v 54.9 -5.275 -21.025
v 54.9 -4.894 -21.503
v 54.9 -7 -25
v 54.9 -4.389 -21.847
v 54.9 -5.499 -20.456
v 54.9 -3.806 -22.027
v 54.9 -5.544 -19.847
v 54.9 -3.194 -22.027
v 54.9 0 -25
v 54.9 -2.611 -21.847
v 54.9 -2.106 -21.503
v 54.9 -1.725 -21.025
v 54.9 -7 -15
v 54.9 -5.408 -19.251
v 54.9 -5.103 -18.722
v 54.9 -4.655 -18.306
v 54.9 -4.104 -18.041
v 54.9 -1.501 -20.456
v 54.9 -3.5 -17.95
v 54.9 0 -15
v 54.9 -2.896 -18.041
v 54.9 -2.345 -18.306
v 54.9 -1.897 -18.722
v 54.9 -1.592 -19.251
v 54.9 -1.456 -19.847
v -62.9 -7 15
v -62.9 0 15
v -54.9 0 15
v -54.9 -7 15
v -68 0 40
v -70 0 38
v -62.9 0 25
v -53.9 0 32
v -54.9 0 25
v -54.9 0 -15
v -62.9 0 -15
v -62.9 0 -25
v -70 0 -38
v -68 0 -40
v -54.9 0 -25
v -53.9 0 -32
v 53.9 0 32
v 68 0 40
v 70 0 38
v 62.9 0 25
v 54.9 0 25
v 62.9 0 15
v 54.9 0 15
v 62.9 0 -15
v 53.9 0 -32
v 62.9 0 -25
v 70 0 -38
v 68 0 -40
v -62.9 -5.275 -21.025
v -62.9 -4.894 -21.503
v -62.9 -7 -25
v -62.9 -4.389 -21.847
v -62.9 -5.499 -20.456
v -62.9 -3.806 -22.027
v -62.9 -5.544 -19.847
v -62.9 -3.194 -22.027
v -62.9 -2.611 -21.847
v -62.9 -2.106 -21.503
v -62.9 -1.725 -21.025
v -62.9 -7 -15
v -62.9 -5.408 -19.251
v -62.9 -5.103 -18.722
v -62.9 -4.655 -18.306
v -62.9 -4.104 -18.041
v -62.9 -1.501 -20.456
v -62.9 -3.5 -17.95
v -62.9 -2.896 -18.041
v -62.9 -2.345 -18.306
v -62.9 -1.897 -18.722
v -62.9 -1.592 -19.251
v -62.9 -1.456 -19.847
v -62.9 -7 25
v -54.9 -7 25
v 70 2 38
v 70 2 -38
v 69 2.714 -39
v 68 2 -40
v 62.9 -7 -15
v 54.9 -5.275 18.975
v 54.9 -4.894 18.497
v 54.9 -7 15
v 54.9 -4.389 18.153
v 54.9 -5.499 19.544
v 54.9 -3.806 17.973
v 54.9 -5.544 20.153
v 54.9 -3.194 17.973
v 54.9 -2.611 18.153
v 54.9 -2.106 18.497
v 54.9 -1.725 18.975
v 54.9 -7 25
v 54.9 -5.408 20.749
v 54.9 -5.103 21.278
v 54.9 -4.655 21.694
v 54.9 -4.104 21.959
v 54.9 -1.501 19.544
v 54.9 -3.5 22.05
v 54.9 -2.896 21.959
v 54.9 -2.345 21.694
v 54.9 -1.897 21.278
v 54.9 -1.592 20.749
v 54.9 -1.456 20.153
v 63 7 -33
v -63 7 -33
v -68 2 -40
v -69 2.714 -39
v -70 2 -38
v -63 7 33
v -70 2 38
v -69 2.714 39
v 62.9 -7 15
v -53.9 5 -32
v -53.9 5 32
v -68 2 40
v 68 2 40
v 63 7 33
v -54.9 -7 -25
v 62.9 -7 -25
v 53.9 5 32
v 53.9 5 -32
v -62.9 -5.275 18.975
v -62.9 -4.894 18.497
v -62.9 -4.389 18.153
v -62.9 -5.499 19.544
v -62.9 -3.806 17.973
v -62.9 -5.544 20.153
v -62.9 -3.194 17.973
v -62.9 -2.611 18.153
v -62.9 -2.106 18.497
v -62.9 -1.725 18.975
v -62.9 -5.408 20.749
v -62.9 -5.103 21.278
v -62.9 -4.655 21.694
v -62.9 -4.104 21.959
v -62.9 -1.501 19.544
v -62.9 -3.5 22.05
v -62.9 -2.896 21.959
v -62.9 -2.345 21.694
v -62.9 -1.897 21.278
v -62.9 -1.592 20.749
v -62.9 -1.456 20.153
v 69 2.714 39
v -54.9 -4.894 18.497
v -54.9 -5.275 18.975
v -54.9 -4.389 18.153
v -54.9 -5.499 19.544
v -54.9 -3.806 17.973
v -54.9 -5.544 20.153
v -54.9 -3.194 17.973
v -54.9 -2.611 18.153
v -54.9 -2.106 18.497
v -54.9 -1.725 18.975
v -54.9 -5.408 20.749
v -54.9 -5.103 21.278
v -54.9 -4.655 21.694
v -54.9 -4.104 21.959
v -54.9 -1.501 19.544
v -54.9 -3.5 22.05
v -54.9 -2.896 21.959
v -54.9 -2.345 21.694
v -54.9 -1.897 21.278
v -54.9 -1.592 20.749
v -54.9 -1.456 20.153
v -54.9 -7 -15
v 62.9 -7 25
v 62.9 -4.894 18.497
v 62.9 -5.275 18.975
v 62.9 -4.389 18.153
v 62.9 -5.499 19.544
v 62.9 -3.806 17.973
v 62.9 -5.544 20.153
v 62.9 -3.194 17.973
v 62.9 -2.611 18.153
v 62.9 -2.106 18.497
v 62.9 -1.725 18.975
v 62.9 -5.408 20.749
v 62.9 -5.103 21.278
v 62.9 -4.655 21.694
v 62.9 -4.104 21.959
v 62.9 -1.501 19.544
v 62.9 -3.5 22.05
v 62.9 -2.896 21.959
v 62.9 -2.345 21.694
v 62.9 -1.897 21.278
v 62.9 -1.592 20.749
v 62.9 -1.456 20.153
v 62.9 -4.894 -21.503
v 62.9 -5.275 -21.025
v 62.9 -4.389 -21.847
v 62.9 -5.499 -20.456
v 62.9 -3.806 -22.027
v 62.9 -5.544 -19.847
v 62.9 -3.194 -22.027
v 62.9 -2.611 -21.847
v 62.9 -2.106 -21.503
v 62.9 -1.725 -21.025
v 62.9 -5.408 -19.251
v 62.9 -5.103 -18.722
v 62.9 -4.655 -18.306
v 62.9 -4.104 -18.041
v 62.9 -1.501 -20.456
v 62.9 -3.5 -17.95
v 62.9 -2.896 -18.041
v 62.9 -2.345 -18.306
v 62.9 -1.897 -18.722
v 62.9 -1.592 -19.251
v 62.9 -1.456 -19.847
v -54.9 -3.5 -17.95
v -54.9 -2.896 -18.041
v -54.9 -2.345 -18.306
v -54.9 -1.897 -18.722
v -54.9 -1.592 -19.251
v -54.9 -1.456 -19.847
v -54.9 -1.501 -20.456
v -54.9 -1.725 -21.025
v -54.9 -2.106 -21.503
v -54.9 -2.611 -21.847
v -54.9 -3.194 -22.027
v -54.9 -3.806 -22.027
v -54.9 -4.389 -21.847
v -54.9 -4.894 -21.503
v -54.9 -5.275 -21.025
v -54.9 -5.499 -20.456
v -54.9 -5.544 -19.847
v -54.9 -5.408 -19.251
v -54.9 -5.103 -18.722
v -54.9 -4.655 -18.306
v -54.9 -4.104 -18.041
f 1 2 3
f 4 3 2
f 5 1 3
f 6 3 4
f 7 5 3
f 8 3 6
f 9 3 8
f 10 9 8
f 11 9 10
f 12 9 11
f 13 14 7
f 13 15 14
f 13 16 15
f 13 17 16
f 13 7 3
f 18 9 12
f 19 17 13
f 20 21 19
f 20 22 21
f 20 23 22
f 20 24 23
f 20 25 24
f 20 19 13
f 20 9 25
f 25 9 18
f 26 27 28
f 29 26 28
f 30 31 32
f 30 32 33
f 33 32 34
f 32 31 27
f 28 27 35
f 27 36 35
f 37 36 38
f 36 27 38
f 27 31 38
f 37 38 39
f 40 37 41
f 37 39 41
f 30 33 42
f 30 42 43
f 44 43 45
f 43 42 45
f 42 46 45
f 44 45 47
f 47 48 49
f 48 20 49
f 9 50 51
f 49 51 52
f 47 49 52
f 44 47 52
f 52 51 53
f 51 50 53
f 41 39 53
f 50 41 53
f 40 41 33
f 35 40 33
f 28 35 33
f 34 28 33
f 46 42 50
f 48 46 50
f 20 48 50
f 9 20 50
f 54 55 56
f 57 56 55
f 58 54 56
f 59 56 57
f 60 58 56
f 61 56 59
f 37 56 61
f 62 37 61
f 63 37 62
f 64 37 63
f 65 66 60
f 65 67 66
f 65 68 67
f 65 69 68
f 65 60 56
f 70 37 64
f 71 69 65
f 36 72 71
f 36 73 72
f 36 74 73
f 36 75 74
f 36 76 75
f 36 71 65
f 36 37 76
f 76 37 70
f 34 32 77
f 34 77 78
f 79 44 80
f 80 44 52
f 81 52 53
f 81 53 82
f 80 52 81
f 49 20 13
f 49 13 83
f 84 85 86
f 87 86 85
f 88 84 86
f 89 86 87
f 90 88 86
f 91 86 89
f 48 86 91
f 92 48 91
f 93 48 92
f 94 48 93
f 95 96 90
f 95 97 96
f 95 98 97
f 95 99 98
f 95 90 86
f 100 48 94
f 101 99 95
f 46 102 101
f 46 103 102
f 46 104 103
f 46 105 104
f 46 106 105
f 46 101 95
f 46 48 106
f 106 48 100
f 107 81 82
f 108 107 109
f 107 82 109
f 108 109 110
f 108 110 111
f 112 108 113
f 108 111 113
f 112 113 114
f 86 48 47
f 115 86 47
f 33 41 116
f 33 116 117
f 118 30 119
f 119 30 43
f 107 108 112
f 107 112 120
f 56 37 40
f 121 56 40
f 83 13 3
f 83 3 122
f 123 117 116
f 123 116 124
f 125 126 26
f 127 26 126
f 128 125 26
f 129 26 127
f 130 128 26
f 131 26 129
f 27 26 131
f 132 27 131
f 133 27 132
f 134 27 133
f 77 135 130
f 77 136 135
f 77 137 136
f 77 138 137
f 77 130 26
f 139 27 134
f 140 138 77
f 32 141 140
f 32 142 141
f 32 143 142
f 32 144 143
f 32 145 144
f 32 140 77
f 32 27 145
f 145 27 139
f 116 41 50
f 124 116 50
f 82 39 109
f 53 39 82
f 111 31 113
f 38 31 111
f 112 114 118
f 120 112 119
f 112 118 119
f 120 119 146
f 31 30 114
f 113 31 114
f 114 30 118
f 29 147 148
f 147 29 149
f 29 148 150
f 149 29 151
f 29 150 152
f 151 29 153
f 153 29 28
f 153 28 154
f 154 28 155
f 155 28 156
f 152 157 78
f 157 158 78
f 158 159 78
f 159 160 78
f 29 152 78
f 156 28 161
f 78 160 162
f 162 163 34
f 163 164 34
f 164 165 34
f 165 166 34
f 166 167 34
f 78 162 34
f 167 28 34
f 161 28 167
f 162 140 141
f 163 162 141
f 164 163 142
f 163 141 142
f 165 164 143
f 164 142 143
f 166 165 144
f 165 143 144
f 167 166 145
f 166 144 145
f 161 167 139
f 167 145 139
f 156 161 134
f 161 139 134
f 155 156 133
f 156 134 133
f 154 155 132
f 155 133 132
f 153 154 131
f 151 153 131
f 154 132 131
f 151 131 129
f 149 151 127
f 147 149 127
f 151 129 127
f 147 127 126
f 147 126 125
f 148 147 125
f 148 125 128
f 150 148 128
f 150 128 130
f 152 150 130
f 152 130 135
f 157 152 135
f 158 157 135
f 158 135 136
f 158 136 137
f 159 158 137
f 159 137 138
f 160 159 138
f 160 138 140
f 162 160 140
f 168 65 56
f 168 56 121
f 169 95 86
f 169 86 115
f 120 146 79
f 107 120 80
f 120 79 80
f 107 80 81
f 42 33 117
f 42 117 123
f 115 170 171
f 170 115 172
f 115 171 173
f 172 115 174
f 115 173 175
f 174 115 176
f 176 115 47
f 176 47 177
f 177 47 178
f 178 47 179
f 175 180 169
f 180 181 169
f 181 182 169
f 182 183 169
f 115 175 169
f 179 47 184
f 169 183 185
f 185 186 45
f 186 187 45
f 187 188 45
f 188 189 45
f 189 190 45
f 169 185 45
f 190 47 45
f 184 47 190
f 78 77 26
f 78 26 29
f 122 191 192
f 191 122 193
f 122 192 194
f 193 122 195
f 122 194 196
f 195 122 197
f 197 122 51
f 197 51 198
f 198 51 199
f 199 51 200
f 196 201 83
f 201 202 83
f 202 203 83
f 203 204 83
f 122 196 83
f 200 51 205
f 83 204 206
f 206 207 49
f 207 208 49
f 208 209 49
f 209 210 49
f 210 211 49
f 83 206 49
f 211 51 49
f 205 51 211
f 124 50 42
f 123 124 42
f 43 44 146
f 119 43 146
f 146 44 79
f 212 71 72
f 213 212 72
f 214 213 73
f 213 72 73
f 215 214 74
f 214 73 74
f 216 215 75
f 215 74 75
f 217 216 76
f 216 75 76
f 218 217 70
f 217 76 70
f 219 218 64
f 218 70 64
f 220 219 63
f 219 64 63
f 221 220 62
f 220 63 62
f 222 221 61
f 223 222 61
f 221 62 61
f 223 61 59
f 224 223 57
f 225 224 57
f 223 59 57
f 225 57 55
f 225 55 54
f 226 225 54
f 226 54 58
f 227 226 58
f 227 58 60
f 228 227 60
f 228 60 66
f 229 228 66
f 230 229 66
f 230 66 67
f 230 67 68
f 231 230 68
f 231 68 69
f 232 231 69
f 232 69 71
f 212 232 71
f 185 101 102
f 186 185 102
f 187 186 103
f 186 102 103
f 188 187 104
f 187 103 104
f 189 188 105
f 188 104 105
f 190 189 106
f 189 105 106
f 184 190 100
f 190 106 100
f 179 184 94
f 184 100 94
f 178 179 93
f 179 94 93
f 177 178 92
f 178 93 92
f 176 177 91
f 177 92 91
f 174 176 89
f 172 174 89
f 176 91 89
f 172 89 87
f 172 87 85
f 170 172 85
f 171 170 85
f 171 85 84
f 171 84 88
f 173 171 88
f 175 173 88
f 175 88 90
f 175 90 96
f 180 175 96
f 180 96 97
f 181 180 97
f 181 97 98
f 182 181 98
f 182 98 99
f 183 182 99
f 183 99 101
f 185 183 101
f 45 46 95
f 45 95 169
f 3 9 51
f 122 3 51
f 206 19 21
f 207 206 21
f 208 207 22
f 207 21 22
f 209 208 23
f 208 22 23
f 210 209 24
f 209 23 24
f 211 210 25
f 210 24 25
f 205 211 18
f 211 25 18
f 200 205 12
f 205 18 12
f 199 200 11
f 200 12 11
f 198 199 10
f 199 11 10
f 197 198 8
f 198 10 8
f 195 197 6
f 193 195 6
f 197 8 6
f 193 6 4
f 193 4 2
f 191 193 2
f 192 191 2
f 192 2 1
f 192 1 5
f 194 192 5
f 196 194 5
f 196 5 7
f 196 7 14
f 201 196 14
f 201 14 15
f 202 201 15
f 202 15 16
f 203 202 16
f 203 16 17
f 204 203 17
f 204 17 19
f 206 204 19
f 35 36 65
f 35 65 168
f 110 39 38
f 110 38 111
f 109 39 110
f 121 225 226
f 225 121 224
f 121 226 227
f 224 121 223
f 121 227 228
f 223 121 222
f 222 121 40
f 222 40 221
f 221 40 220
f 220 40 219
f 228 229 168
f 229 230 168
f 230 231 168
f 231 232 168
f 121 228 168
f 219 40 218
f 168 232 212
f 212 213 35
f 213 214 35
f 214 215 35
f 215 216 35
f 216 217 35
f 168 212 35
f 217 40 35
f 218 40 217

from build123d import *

# Parameters (mm, degrees)
SKETCH1_W           = 140
SKETCH1_H           = 80
BOSS_EXTRUDE1_DEPTH = 2
SKETCH3_W           = 126
SKETCH3_H           = 66
SKETCH2_W           = 140
SKETCH2_H           = 80
CHAMFER2_SIZE       = 2
SKETCH4_W           = 8
SKETCH4_H           = 10
BOSS_EXTRUDE2_DEPTH = 7
SKETCH5_R           = 2.05
CUT_EXTRUDE1_DEPTH  = 133.9000001
SKETCH6_W           = 107.8
SKETCH6_H           = 64
CUT_EXTRUDE2_DEPTH  = 5


with BuildPart() as part:
    # Sketch1 → Boss-Extrude1 (new body)
    with BuildSketch(Plane(origin=(0, 0, 0), x_dir=(1, 0, 0), z_dir=(0, 1, 0))):
        Rectangle(SKETCH1_W, SKETCH1_H)
    extrude(amount=BOSS_EXTRUDE1_DEPTH)

    # Sketch3 → Loft1 section 0
    with BuildSketch(Plane(origin=(0, 7, 0), x_dir=(1, 0, 0), z_dir=(0, 1, 0))):
        Rectangle(SKETCH3_W, SKETCH3_H)
    # Sketch2 → Loft1 section 1
    with BuildSketch(Plane(origin=(0, 2, 0), x_dir=(1, 0, 0), z_dir=(0, 1, 0))):
        Rectangle(SKETCH2_W, SKETCH2_H)
    loft()

    # Chamfer2
    chamfer2_edges = [part.edges().sort_by_distance(p)[0] for p in [
        (70, 1, 40),
        (-70, 1, 40),
        (-70, 1, -40),
        (70, 1, -40),
    ]]
    chamfer(chamfer2_edges, length=CHAMFER2_SIZE)

    # Sketch4 → Boss-Extrude2 (add)
    with BuildSketch(Plane.XZ):
        with Locations((-58.9, 20)):
            Rectangle(SKETCH4_W, SKETCH4_H)
        with Locations((-58.9, -20)):
            Rectangle(SKETCH4_W, SKETCH4_H)
        with Locations((58.9, -20)):
            Rectangle(SKETCH4_W, SKETCH4_H)
        with Locations((58.9, 20)):
            Rectangle(SKETCH4_W, SKETCH4_H)
    extrude(amount=BOSS_EXTRUDE2_DEPTH)

    # Sketch5 → Cut-Extrude1 (cut, through all)
    with BuildSketch(Plane.ZY.offset(62.9)):
        with Locations((-20, -3.5)):
            Circle(SKETCH5_R)
        with Locations((20, -3.5)):
            Circle(SKETCH5_R)
    extrude(amount=-CUT_EXTRUDE1_DEPTH, mode=Mode.SUBTRACT)

    # Sketch6 → Cut-Extrude2 (cut)
    with BuildSketch(Plane.XZ):
        Rectangle(SKETCH6_W, SKETCH6_H)
    extrude(amount=-CUT_EXTRUDE2_DEPTH, mode=Mode.SUBTRACT)


solid = part.part
